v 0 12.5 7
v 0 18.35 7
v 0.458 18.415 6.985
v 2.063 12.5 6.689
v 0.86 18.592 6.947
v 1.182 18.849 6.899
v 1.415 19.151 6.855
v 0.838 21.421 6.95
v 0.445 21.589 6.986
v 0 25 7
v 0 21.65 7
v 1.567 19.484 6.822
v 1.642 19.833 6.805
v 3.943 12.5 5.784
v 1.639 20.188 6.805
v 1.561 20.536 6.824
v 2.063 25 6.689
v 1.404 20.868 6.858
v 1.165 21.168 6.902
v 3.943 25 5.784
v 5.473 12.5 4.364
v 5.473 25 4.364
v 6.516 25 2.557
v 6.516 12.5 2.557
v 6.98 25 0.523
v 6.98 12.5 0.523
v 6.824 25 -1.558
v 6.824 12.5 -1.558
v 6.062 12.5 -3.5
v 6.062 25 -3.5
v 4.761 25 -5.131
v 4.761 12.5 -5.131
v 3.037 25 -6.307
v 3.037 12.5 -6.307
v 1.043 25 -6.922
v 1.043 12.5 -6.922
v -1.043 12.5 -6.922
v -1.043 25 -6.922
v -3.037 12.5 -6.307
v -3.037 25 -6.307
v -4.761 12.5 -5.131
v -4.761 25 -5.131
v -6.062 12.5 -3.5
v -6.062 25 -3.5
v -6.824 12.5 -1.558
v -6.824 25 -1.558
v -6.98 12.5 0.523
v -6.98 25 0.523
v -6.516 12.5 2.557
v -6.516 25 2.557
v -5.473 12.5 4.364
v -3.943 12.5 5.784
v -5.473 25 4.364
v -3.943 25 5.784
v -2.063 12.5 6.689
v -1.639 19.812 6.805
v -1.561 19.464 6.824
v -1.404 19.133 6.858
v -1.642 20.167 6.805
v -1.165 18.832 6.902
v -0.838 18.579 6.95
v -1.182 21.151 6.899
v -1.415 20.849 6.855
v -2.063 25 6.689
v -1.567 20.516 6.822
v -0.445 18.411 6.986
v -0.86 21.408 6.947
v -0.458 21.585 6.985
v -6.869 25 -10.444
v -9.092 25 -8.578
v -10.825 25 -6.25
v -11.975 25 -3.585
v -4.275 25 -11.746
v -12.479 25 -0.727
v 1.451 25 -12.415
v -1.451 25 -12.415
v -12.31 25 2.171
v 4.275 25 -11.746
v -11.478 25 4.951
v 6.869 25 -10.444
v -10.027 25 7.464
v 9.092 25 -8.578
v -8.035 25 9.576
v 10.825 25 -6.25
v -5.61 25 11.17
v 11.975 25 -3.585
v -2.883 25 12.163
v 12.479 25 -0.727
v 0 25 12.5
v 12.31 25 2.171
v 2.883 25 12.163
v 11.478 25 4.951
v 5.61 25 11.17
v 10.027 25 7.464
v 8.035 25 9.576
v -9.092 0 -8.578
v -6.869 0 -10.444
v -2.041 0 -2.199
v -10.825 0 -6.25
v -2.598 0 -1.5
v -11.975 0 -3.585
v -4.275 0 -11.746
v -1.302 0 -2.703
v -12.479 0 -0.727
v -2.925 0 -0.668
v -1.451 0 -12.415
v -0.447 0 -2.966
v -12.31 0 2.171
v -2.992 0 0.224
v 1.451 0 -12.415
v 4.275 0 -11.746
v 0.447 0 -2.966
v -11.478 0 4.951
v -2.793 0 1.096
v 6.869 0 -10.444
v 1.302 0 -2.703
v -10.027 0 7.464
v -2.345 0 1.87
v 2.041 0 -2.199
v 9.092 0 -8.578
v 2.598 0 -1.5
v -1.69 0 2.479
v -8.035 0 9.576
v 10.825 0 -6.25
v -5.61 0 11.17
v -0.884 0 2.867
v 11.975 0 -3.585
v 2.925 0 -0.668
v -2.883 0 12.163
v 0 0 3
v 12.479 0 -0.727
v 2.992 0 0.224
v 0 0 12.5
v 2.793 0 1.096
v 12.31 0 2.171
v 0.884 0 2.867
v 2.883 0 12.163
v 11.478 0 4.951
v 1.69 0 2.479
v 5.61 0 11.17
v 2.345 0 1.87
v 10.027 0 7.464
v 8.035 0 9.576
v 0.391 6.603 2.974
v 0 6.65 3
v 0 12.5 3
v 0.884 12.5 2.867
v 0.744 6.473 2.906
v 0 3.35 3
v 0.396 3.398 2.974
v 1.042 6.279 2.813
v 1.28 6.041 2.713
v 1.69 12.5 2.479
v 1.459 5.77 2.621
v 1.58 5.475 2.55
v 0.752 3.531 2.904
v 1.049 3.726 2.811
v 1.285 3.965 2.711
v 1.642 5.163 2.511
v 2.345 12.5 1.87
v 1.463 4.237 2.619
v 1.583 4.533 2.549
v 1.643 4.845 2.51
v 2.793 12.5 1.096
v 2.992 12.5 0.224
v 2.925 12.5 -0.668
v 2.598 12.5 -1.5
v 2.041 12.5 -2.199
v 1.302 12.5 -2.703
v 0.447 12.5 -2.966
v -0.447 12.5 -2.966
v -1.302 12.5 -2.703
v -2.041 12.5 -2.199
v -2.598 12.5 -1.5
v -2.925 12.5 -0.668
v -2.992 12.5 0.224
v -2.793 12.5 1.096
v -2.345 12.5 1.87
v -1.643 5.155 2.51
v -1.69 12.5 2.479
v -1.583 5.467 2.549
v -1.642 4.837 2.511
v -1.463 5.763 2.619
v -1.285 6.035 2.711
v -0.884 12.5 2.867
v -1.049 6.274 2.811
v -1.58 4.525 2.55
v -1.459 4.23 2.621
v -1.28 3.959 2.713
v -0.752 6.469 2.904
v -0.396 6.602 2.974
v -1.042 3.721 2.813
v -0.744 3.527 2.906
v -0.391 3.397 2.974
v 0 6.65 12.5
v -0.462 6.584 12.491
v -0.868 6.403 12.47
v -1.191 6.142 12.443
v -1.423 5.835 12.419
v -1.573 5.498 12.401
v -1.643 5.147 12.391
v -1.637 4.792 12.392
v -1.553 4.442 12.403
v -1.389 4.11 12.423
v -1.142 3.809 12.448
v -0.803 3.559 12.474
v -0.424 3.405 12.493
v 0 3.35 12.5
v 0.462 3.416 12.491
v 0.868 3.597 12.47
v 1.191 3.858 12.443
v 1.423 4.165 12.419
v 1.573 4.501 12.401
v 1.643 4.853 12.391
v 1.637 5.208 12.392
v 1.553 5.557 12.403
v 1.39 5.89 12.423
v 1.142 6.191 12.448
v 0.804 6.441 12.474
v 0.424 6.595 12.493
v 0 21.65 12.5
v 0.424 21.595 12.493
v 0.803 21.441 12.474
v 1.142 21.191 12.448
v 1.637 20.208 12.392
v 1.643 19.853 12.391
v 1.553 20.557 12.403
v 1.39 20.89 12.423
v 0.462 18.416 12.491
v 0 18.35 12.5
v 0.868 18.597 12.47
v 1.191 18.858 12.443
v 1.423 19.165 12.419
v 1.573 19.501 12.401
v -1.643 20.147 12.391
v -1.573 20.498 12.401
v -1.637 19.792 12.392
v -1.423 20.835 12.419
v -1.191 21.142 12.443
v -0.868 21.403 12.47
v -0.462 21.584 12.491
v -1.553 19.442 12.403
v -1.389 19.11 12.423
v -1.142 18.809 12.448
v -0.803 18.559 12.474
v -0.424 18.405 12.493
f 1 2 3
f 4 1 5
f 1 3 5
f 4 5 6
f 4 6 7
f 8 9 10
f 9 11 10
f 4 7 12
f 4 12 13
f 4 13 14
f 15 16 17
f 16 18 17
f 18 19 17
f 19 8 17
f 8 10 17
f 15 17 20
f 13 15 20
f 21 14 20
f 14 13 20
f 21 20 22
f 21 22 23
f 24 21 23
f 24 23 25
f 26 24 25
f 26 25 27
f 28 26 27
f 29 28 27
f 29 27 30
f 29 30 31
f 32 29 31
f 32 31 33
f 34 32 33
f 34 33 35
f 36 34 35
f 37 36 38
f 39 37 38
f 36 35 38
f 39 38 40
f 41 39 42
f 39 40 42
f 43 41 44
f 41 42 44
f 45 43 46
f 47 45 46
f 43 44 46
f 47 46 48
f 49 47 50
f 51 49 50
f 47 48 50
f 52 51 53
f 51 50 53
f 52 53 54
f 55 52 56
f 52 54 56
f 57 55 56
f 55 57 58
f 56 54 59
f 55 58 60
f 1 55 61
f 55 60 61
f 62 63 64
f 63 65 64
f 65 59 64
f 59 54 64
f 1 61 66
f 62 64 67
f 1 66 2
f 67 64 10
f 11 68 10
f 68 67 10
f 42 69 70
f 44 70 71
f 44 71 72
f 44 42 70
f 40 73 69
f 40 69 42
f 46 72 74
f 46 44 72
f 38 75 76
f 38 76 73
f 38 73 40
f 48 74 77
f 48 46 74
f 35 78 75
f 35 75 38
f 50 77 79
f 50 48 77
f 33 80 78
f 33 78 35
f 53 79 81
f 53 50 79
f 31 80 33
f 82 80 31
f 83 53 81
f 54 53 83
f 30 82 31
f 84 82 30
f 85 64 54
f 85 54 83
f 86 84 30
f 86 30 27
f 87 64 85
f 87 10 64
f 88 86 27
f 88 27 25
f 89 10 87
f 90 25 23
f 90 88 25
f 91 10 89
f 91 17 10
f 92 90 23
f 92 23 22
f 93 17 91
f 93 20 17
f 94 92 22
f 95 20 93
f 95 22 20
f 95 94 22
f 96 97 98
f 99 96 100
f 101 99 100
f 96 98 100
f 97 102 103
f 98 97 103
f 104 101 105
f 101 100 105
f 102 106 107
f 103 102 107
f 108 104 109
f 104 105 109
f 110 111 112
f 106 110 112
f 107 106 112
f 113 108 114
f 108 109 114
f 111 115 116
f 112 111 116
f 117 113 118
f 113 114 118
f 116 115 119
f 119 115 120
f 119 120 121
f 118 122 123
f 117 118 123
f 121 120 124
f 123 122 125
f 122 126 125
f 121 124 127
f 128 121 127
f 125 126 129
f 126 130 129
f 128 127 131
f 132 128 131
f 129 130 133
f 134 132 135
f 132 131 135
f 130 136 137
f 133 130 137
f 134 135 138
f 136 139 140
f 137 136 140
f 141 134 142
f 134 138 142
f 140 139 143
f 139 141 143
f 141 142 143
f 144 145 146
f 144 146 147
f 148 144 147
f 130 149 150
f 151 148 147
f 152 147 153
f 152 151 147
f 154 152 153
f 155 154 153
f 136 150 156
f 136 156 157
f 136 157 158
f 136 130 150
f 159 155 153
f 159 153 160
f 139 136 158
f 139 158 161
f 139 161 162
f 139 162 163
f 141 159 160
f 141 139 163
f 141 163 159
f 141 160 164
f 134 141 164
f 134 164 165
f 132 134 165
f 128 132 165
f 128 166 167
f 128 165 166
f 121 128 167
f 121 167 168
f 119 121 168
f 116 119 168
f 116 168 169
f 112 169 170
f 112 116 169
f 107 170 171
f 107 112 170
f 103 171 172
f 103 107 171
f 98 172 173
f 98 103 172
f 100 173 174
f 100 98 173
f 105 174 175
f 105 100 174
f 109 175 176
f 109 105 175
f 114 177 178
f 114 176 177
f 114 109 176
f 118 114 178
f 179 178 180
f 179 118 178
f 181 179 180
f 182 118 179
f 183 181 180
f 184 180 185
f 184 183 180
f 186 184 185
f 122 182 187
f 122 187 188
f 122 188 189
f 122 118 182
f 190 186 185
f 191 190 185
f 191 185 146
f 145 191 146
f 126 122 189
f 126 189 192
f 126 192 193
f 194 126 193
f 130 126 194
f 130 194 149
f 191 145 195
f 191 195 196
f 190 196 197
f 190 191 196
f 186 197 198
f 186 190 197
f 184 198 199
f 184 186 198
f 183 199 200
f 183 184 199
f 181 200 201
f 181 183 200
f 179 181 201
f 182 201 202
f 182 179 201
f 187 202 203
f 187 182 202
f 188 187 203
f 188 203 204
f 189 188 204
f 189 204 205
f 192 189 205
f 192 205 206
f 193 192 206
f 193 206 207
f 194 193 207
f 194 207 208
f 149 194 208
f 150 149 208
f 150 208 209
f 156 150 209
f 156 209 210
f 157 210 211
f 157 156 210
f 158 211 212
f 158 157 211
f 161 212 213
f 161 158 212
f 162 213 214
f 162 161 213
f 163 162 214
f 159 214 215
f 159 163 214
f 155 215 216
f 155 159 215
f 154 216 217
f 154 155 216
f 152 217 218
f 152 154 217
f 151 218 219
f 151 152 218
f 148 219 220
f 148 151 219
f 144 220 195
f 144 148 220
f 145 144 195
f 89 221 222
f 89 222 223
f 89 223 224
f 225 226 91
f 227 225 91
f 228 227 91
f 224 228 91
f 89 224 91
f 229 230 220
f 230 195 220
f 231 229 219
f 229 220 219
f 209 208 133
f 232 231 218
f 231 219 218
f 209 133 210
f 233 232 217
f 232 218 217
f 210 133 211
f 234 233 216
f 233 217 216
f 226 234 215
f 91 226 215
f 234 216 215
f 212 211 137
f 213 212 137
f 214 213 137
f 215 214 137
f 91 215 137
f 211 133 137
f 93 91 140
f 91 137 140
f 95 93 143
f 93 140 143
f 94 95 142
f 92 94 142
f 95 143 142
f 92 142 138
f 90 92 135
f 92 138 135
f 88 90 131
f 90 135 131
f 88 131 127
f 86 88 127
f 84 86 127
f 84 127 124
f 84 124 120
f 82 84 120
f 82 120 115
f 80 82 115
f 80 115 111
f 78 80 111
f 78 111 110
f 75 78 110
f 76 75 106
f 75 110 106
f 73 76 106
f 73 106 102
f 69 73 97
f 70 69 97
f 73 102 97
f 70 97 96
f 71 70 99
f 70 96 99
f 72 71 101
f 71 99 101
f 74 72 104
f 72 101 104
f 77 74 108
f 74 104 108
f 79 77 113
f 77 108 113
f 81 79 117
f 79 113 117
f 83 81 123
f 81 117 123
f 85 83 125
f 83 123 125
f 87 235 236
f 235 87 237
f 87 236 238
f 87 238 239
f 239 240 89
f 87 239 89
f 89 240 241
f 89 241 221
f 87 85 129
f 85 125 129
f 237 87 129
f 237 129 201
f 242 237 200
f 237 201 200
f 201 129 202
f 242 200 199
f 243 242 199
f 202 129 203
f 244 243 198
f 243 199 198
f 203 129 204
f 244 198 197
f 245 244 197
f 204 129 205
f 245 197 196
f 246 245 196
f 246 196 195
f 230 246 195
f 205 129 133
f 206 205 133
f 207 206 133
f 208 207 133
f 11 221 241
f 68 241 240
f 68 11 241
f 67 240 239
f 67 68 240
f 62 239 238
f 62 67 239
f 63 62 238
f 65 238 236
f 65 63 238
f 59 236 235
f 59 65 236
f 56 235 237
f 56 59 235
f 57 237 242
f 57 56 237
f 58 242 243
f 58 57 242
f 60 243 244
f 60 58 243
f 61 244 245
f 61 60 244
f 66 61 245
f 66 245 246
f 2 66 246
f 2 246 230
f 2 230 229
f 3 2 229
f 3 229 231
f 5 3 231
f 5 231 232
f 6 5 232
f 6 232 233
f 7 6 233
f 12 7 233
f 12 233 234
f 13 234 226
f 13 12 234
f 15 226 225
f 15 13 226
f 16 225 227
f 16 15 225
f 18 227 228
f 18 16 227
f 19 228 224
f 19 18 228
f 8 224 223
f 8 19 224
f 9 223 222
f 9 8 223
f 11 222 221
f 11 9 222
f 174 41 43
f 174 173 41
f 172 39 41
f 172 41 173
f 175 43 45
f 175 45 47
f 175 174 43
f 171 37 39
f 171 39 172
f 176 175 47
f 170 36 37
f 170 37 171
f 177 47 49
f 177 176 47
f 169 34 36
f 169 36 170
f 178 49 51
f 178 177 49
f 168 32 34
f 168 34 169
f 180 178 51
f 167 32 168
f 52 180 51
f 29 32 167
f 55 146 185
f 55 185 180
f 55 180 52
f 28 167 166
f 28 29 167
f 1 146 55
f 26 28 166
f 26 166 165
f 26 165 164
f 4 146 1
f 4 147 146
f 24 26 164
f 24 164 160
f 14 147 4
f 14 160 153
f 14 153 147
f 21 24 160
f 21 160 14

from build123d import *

# Parameters (mm, degrees)
SKETCH1_R           = 12.5
SKETCH1_R_2         = 3
BOSS_EXTRUDE1_DEPTH = 25
SKETCH2_R           = 7
CUT_EXTRUDE1_DEPTH  = 12.5
SKETCH3_R           = 1.65
CUT_EXTRUDE2_DEPTH  = 31.618621785


with BuildPart() as part:
    # Sketch1 → Boss-Extrude1 (new body)
    with BuildSketch(Plane(origin=(0, 0, 0), x_dir=(1, 0, 0), z_dir=(0, 1, 0))):
        with Locations(Location((0, 0, 0), (0, 0, 270))):
            Circle(SKETCH1_R)
        with Locations(Location((0, 0, 0), (0, 0, 270))):
            Circle(SKETCH1_R_2, mode=Mode.SUBTRACT)
    extrude(amount=BOSS_EXTRUDE1_DEPTH)

    # Sketch2 → Cut-Extrude1 (cut)
    with BuildSketch(Plane(origin=(0, 25, 0), x_dir=(1, 0, 0), z_dir=(0, 1, 0))):
        with Locations(Location((0, 0, 0), (0, 0, 270))):
            Circle(SKETCH2_R)
    extrude(amount=-CUT_EXTRUDE1_DEPTH, mode=Mode.SUBTRACT)

    # Sketch3 → Cut-Extrude2 (cut, through all)
    with BuildSketch(Plane.XY):
        with Locations(Location((0, 5, 0), (0, 0, 90.000000006))):
            Circle(SKETCH3_R)
        with Locations(Location((0, 20, 0), (0, 0, 90))):
            Circle(SKETCH3_R)
    extrude(amount=CUT_EXTRUDE2_DEPTH, mode=Mode.SUBTRACT)


solid = part.part
